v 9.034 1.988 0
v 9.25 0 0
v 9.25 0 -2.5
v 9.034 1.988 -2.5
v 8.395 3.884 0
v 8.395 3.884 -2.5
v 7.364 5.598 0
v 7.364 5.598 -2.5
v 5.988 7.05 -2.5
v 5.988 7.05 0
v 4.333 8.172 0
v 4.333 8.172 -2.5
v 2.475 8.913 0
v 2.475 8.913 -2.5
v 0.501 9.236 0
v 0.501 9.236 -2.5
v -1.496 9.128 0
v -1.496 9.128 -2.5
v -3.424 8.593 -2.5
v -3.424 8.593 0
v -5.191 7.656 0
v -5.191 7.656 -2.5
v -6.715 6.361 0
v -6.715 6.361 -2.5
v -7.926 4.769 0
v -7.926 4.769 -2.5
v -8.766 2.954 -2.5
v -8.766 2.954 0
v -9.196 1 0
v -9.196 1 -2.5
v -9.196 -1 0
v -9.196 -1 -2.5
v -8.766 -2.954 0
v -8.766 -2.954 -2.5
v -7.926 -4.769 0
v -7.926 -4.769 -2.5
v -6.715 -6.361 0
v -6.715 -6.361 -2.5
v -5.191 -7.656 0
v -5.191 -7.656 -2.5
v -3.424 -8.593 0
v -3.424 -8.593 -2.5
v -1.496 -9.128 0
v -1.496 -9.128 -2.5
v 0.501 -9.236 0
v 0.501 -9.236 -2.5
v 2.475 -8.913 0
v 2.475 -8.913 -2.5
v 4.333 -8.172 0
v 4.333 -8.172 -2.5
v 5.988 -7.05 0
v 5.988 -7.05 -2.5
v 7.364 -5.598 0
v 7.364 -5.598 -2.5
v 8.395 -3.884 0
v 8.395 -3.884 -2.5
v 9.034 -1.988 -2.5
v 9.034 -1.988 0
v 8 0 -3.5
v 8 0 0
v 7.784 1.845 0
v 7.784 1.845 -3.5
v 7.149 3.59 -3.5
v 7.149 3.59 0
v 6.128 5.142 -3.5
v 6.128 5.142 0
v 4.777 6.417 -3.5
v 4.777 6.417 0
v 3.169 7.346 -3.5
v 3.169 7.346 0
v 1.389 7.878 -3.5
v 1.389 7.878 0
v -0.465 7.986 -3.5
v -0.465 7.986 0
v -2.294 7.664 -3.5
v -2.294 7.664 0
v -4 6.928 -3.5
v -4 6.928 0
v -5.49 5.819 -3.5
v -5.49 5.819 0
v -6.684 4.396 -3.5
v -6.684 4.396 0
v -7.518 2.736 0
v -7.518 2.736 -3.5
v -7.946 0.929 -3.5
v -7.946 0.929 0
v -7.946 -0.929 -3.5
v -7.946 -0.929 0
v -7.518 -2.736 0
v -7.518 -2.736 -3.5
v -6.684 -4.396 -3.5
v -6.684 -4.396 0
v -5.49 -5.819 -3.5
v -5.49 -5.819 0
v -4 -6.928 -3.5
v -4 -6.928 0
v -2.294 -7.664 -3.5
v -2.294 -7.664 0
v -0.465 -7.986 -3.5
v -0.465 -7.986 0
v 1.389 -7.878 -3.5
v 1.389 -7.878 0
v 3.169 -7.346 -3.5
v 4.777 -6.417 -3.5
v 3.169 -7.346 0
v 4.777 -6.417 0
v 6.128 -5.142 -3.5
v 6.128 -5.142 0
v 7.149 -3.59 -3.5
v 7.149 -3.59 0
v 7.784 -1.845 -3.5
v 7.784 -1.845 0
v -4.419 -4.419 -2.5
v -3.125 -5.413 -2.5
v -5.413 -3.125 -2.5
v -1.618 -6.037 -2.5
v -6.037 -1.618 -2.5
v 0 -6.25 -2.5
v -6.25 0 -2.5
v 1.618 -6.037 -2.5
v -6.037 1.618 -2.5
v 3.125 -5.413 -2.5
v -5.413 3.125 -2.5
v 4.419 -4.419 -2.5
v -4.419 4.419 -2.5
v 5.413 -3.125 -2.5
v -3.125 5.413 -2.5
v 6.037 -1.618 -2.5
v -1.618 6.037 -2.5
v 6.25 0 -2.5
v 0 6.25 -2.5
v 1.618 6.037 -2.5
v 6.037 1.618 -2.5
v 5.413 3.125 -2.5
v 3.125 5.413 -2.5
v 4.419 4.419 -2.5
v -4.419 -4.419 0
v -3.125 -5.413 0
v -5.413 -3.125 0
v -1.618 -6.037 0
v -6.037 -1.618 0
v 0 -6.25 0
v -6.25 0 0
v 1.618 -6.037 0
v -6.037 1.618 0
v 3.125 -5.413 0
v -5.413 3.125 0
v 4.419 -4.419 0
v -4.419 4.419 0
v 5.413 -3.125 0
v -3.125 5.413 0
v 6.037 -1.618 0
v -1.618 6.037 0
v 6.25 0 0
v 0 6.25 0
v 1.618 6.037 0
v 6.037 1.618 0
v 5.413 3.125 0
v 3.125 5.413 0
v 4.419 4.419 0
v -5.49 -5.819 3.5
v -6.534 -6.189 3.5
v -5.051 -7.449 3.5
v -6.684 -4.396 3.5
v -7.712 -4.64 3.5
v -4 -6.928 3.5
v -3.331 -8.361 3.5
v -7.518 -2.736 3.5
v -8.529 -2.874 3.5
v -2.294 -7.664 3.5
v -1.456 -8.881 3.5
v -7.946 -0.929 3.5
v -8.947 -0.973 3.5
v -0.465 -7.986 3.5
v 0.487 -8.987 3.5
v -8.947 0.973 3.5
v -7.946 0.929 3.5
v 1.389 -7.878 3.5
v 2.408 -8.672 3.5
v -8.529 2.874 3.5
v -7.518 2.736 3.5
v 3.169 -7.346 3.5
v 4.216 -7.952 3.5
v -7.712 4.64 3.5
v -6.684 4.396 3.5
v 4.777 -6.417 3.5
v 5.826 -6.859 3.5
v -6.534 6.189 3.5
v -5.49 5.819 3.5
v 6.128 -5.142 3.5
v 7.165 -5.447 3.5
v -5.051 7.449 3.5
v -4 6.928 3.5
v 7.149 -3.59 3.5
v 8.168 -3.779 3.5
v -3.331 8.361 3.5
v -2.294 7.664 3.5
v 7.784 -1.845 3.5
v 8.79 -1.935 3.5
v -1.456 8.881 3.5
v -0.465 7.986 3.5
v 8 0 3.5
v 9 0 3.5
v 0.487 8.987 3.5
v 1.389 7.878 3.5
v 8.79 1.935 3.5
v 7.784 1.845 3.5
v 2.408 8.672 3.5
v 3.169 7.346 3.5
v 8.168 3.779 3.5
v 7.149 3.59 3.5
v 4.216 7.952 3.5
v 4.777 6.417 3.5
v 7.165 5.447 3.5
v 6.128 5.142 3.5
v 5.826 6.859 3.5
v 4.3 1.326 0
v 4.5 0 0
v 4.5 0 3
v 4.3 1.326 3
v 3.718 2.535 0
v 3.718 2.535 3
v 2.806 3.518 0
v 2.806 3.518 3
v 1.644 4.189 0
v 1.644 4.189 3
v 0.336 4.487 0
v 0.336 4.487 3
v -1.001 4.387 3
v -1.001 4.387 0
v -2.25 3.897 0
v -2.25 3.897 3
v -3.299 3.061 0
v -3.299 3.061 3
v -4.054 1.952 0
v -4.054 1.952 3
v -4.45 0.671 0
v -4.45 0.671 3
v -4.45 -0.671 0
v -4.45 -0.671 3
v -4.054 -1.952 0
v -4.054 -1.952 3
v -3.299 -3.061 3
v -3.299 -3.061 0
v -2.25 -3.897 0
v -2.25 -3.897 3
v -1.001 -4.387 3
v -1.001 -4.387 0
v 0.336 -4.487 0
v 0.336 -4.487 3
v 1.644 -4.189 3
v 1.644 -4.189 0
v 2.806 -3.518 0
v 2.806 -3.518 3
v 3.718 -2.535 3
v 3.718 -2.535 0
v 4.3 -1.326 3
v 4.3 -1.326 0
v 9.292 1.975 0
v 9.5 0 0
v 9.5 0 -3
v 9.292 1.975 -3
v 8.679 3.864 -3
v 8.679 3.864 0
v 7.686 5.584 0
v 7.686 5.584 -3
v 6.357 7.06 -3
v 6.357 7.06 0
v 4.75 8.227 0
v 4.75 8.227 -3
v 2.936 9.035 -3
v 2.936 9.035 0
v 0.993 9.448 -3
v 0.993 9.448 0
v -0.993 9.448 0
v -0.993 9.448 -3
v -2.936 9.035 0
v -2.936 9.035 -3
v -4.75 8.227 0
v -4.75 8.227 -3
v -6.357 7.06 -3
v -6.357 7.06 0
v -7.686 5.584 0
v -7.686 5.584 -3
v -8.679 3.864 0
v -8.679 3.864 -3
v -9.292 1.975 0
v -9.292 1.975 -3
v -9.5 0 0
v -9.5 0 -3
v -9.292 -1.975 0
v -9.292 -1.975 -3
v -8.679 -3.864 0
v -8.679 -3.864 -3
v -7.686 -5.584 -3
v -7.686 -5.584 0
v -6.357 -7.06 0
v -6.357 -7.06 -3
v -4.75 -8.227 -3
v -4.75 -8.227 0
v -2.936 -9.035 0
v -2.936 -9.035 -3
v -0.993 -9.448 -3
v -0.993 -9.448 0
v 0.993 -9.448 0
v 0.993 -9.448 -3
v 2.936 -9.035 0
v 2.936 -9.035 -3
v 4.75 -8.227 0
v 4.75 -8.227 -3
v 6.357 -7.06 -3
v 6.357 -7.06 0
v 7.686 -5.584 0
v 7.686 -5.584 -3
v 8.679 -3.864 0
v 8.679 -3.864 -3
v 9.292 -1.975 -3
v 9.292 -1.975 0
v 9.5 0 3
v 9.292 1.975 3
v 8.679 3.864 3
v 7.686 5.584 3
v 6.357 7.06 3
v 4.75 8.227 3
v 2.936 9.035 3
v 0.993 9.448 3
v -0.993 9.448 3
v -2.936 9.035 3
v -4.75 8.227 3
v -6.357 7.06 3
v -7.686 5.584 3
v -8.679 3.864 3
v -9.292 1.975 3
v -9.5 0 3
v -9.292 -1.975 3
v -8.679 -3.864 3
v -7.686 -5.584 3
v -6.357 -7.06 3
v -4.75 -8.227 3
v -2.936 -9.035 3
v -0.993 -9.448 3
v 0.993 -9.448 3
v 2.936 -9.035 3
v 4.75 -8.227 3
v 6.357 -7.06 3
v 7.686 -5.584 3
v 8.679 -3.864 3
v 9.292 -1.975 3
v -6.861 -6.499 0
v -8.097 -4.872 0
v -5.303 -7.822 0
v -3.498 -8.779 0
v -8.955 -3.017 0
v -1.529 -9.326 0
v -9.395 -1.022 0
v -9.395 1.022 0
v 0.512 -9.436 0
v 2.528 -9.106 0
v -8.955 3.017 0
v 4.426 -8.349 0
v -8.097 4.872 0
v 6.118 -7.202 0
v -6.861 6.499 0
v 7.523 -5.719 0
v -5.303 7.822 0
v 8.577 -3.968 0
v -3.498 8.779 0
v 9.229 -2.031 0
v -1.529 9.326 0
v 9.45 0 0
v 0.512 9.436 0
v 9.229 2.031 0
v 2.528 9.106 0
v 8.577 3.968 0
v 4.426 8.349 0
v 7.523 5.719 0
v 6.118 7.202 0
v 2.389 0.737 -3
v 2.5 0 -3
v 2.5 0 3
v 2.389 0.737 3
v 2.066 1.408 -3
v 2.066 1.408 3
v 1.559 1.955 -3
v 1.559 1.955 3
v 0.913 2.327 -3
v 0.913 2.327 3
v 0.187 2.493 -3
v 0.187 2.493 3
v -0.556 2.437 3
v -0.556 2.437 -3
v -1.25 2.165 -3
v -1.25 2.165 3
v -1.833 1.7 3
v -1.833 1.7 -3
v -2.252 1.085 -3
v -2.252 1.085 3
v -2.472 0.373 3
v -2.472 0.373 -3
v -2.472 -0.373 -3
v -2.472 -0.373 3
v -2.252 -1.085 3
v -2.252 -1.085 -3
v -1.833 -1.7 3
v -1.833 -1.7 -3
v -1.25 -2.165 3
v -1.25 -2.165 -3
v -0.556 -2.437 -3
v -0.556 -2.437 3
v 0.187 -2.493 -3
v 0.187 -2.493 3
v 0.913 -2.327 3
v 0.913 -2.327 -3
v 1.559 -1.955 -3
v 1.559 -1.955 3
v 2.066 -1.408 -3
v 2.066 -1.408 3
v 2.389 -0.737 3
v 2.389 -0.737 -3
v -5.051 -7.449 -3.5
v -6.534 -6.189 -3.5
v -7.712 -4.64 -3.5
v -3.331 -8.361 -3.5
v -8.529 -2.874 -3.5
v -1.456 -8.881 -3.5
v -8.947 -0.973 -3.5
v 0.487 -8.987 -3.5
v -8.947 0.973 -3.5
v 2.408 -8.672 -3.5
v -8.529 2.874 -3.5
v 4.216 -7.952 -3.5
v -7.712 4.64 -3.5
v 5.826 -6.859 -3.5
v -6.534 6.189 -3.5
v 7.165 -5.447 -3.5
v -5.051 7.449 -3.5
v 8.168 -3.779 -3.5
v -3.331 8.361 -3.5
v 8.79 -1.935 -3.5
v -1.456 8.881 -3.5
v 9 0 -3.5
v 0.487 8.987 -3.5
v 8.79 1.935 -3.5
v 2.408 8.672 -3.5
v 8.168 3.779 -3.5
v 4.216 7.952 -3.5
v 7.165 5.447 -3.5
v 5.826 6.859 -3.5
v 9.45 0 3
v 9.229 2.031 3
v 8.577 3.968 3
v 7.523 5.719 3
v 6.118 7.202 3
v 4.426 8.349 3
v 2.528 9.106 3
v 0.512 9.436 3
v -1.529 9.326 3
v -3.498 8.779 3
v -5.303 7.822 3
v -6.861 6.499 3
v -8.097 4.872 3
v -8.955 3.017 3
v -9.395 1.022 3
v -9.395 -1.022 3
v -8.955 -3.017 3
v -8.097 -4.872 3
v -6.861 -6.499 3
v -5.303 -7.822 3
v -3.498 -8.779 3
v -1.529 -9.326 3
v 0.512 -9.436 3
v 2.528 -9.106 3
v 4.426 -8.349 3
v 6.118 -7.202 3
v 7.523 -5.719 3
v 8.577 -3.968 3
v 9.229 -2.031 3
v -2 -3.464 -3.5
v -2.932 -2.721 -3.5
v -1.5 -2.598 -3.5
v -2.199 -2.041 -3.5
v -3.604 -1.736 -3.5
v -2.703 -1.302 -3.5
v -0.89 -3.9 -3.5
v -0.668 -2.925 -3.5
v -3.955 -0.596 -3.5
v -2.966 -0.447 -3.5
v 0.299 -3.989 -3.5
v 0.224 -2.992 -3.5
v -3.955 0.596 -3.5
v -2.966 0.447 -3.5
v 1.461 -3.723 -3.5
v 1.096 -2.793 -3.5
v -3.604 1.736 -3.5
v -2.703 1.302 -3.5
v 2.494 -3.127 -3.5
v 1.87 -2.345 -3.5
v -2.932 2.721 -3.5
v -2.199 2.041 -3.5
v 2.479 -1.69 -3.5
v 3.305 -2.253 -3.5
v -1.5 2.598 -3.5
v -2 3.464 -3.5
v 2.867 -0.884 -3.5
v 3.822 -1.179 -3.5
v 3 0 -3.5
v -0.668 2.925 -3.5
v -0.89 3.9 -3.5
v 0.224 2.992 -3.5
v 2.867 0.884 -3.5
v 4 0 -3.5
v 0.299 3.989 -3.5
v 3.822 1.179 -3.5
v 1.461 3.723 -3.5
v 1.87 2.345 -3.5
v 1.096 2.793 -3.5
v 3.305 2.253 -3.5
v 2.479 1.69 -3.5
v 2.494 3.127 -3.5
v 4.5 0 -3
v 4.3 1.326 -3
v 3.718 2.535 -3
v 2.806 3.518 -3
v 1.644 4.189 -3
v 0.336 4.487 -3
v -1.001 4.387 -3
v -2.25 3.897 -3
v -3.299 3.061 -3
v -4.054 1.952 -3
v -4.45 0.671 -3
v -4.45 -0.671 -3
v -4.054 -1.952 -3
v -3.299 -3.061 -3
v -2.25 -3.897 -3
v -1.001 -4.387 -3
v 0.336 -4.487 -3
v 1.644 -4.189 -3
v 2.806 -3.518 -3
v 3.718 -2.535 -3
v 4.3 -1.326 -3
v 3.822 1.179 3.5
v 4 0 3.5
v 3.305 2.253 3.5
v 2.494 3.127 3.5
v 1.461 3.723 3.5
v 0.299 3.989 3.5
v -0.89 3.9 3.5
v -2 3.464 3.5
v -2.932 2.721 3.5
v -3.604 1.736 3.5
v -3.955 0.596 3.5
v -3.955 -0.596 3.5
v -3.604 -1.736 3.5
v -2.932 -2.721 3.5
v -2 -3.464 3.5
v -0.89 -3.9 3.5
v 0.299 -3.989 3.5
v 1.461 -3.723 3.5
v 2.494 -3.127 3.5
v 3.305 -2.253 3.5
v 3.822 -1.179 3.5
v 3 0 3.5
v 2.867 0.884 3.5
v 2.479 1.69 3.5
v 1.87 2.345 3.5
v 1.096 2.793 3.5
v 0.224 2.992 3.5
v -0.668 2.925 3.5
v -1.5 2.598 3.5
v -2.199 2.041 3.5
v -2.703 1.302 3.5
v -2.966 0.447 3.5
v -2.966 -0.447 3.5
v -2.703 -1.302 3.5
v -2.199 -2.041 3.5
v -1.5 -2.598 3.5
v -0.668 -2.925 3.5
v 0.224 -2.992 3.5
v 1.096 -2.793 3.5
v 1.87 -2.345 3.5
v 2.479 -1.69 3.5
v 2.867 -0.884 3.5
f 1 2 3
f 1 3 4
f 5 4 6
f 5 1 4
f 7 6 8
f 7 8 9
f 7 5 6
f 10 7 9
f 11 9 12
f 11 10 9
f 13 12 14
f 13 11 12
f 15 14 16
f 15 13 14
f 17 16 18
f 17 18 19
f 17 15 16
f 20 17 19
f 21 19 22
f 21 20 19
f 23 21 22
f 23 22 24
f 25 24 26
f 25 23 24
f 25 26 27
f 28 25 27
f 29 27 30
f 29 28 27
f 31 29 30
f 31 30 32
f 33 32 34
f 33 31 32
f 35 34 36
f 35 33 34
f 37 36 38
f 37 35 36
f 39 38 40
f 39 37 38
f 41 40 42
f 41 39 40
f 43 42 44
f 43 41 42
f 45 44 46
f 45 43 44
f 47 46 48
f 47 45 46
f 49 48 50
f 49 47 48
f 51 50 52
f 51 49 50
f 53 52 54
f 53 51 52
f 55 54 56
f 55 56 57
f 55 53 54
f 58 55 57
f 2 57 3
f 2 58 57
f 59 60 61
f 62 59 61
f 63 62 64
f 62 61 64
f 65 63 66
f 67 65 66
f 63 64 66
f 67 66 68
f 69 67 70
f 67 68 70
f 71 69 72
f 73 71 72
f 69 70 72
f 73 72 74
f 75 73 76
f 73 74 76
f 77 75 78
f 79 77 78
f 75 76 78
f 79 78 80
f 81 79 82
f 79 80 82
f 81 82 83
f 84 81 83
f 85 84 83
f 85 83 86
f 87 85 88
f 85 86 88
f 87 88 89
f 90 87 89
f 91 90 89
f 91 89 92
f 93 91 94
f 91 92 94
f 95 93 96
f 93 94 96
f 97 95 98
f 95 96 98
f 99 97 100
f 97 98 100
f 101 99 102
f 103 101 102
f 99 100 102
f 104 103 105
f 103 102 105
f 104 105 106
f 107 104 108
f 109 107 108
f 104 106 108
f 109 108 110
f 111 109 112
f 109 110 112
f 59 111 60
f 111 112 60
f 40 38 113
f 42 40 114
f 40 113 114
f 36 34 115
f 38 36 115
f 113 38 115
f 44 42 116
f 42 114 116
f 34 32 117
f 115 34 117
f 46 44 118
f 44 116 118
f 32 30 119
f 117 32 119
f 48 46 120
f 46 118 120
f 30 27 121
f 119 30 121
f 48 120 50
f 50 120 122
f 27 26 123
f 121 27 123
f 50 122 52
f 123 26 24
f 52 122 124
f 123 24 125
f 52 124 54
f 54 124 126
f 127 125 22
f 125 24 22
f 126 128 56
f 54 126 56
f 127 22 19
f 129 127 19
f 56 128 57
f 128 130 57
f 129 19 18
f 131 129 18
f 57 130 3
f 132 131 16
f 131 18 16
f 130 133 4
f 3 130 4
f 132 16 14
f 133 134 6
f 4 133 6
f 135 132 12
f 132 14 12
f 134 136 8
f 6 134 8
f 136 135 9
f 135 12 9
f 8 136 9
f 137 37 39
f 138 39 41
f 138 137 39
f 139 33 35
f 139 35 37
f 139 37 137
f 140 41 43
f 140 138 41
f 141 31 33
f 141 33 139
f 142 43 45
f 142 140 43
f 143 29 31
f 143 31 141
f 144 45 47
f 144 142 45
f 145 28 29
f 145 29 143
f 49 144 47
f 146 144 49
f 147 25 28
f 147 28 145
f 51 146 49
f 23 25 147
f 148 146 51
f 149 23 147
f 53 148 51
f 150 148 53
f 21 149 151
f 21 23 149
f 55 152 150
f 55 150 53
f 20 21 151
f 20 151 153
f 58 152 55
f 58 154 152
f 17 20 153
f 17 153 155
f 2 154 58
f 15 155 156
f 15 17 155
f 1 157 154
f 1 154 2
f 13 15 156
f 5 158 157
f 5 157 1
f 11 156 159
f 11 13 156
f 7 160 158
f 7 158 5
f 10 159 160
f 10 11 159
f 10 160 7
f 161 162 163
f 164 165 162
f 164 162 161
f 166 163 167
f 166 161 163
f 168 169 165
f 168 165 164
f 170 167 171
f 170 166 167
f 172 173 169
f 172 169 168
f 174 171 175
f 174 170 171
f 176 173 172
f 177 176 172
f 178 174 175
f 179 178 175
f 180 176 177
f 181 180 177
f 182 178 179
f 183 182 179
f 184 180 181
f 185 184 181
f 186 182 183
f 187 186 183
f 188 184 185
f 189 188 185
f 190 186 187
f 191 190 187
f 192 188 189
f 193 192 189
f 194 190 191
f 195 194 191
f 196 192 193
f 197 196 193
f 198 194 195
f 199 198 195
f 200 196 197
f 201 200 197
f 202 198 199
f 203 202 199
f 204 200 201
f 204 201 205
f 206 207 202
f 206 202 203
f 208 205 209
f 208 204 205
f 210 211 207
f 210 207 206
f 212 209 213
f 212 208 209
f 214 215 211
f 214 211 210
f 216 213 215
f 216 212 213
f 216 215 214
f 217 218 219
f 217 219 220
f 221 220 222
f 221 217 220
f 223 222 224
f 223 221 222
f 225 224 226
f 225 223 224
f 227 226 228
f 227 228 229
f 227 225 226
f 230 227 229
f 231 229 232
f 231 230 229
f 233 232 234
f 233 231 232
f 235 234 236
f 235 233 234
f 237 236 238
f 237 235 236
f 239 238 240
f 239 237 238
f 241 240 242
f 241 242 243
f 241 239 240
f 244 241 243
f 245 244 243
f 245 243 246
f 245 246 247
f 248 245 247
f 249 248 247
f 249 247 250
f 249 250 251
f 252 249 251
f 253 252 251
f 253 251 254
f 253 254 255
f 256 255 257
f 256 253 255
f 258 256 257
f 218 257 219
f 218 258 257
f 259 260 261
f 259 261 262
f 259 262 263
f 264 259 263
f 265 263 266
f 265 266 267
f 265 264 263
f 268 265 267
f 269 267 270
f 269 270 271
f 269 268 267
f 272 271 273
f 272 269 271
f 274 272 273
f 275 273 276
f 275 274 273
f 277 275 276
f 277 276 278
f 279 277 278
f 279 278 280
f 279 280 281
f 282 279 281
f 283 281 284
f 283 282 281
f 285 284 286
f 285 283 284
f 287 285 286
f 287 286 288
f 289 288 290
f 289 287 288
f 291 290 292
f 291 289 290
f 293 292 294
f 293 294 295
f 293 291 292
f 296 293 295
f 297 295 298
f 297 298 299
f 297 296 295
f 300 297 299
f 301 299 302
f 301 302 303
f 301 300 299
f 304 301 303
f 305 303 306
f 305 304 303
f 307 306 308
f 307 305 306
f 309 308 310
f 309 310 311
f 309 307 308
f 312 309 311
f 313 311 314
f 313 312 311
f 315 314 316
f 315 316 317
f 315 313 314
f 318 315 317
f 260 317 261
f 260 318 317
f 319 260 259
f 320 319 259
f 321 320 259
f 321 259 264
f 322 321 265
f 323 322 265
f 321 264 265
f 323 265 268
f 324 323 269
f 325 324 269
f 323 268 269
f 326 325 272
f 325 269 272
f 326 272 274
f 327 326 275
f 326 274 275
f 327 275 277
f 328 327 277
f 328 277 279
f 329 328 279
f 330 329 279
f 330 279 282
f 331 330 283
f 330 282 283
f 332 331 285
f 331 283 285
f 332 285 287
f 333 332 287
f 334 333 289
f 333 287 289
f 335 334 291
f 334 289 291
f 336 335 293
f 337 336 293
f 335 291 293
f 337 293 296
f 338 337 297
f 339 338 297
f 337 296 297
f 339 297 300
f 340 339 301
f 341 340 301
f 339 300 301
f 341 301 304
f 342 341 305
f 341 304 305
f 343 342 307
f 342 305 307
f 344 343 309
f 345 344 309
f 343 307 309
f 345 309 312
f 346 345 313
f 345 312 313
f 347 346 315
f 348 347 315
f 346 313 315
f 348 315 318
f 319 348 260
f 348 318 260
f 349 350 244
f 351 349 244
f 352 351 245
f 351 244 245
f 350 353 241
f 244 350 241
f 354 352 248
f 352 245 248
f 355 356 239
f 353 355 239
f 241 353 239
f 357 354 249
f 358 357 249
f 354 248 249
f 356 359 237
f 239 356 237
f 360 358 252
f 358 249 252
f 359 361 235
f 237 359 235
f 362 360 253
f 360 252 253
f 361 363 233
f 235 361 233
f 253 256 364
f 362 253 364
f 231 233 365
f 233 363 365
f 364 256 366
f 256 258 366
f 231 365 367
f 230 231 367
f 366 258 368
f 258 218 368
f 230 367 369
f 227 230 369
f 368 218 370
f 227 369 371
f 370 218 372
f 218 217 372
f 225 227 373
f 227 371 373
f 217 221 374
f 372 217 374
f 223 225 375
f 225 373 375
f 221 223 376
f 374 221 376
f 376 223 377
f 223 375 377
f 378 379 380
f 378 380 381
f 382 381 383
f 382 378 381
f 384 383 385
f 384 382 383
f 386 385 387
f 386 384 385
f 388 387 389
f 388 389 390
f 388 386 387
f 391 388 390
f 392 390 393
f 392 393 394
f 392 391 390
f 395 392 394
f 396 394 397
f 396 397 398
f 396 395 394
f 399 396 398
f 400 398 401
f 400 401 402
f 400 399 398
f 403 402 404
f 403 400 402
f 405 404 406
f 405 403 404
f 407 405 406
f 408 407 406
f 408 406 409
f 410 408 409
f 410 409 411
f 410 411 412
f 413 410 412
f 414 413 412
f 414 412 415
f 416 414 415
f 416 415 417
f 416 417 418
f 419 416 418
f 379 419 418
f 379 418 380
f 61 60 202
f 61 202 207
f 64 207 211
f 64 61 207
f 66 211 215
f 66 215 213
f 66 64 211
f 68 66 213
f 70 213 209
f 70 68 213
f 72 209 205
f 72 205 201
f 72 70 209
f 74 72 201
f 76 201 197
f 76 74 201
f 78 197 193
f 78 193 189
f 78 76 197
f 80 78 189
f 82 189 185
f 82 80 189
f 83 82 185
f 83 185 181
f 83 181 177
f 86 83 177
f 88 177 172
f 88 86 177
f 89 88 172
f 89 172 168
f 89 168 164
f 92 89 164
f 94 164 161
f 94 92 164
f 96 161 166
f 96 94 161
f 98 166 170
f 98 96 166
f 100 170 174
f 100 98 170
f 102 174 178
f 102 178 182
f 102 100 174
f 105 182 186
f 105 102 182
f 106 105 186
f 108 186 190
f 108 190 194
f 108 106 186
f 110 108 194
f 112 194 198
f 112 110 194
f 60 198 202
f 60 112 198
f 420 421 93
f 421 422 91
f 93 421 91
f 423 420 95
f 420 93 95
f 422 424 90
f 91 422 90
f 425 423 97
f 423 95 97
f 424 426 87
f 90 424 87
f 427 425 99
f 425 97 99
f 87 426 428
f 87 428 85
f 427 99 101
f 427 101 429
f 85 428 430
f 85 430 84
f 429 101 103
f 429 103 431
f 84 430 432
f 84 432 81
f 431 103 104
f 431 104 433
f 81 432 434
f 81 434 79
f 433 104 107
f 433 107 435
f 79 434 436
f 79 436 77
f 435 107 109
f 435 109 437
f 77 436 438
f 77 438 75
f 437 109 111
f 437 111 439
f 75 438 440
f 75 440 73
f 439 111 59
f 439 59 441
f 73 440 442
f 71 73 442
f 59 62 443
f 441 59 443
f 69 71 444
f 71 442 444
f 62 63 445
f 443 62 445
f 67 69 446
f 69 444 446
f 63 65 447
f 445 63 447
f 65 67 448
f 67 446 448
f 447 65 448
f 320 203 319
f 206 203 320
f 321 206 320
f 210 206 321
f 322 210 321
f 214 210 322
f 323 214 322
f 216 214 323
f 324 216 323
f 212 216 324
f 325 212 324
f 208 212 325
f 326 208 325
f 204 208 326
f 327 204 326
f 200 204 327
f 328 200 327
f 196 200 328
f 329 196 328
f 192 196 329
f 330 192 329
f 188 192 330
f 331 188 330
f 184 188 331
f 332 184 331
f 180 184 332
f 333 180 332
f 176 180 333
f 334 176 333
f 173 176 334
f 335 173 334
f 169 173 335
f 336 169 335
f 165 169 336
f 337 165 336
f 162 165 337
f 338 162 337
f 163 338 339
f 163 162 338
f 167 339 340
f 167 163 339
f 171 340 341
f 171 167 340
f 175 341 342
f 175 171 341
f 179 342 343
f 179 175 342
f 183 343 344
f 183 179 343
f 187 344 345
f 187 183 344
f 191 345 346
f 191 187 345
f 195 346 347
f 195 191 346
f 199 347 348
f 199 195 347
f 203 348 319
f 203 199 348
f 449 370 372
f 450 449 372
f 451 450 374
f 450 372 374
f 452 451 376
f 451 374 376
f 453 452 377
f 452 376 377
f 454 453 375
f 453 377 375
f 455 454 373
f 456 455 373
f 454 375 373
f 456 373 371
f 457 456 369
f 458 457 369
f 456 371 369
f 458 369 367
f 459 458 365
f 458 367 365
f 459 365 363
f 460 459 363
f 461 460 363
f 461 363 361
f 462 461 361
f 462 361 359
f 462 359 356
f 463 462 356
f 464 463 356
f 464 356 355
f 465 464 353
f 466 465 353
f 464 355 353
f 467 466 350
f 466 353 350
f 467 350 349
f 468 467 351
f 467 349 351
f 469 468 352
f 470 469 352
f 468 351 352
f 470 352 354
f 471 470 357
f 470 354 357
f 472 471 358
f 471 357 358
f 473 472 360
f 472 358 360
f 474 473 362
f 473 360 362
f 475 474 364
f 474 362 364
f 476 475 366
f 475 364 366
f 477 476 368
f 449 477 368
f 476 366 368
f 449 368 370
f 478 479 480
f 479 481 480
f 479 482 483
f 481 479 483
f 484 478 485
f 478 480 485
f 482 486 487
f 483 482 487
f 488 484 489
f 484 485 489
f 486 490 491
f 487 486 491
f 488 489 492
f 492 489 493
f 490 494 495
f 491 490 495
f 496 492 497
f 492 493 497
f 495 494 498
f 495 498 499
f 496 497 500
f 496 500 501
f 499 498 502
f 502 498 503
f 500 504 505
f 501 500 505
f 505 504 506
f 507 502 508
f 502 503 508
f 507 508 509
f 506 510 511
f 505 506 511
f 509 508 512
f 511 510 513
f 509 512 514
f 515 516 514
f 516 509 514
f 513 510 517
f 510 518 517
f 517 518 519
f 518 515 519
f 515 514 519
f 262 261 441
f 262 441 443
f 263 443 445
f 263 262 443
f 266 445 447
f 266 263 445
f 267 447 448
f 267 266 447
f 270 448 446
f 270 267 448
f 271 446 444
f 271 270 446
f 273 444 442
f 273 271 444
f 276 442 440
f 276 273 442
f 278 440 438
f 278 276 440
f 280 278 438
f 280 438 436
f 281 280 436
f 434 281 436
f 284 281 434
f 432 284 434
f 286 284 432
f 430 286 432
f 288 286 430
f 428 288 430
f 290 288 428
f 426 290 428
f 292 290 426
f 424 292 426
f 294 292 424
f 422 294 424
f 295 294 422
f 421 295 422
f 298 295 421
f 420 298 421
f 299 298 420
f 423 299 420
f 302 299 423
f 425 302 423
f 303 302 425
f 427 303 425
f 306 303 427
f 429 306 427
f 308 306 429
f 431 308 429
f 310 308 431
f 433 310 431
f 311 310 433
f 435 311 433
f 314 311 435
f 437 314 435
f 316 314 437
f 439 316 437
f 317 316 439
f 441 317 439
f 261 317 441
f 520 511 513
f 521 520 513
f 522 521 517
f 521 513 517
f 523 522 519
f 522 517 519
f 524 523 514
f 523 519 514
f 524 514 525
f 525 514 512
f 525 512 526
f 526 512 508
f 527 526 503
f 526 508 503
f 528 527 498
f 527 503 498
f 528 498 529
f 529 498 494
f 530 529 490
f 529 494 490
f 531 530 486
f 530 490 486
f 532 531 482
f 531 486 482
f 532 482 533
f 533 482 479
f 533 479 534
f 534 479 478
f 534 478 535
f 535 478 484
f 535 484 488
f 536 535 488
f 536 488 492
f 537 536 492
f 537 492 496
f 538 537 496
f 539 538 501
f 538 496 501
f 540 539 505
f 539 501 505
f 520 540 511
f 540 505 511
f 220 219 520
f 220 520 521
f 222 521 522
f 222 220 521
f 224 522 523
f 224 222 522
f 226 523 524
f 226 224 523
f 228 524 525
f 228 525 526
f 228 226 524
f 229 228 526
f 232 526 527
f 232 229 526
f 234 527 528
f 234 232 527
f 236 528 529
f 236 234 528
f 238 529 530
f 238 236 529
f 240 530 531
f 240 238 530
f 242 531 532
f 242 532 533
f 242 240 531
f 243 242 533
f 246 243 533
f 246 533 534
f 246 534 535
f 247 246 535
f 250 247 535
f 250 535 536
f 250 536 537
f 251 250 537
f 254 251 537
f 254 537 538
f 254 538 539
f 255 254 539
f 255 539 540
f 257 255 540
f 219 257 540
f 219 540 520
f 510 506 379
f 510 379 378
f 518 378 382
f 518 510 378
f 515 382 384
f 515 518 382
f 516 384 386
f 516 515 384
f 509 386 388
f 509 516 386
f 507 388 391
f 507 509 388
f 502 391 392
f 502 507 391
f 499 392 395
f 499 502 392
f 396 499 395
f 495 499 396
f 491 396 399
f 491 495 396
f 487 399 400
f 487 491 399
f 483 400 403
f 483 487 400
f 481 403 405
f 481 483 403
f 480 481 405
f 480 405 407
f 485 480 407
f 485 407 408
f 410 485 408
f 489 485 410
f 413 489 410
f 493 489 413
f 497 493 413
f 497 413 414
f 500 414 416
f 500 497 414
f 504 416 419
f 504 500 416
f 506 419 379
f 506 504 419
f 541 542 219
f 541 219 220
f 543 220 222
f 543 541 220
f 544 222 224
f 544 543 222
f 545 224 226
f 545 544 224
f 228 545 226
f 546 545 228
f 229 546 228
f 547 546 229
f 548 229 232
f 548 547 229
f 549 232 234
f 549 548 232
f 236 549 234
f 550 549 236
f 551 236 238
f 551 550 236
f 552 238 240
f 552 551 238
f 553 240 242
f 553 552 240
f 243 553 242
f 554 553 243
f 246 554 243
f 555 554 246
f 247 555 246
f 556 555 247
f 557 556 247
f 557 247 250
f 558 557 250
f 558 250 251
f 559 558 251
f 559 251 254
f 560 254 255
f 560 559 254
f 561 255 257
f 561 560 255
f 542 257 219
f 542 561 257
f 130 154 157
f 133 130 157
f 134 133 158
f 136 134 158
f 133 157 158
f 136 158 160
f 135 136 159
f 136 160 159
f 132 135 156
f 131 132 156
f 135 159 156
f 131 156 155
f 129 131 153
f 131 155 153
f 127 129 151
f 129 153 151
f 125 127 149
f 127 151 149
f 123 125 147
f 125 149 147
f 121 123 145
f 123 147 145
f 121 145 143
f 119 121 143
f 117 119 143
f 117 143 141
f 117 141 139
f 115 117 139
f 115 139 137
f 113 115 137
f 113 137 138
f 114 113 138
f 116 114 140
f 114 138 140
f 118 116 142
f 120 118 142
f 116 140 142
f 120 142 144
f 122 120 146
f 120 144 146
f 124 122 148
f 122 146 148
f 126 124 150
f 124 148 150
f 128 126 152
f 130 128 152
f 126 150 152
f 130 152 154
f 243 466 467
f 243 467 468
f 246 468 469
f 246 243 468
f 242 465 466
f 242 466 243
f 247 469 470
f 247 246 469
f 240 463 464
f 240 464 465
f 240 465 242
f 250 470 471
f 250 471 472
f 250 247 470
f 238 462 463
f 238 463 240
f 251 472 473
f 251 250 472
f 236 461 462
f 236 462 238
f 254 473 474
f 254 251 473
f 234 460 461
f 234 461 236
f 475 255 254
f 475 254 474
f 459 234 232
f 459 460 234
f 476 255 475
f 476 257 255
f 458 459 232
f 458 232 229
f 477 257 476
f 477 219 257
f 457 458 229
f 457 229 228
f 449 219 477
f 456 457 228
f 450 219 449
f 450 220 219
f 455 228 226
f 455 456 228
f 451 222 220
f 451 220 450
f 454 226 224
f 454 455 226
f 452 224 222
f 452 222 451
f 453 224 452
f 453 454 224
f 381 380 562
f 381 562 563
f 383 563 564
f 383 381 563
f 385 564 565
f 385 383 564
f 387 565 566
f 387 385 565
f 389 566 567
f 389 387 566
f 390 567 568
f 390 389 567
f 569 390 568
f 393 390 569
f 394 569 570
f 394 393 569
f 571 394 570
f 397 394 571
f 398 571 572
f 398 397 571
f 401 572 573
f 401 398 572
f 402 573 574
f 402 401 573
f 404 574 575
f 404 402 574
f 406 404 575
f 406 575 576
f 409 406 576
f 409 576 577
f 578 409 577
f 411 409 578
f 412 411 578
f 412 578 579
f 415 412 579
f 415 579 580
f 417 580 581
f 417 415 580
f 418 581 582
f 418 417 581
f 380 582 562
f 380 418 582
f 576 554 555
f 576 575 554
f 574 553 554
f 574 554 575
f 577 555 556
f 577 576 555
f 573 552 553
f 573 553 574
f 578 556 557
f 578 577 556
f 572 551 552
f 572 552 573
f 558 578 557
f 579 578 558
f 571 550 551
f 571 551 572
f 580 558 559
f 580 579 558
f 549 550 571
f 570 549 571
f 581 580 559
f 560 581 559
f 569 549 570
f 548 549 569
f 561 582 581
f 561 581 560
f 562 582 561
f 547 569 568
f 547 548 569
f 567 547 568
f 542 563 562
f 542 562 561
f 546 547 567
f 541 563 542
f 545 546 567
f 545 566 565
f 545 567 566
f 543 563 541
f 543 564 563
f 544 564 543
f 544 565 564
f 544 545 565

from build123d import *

# Parameters (mm, degrees)
F0_R     = 9.5
F0_R_2   = 8
F0_R_3   = 4.5
F0_R_4   = 2.5
F1_DEPTH = 3.5
F2_R     = 9.25
F2_R_2   = 6.25
F3_DEPTH = 2.5
F4_R     = 9.45
F4_R_2   = 4.5
F5_DEPTH = 3
F6_SIZE  = 0.5


with BuildPart() as f1:
    # F0 (on Top) → F1 (new body, symmetric)
    with BuildSketch(Plane.XY):
        Circle(F0_R)
        Circle(F0_R_2, mode=Mode.SUBTRACT)
        Circle(F0_R_3)
        Circle(F0_R_4, mode=Mode.SUBTRACT)
    extrude(amount=F1_DEPTH, both=True)

    # F6
    f6_edges = [f1.edges().sort_by_distance(p)[0] for p in [
        (-9.5, 0, 3.5),
        (-9.5, 0, -3.5),
        (-4.5, 0, 3.5),
        (-2.5, 0, 3.5),
        (-4.5, 0, -3.5),
        (-2.5, 0, -3.5),
    ]]
    chamfer(f6_edges, length=F6_SIZE)


with BuildPart() as f3:
    # F2 (on Top) → F3 (new body)
    with BuildSketch(Plane.XY):
        Circle(F2_R)
        Circle(F2_R_2, mode=Mode.SUBTRACT)
    extrude(amount=-F3_DEPTH)


with BuildPart() as f5:
    # F4 (on Top) → F5 (new body)
    with BuildSketch(Plane.XY):
        Circle(F4_R)
        Circle(F4_R_2, mode=Mode.SUBTRACT)
    extrude(amount=F5_DEPTH)


solid = Compound([f1.part, f3.part, f5.part])
